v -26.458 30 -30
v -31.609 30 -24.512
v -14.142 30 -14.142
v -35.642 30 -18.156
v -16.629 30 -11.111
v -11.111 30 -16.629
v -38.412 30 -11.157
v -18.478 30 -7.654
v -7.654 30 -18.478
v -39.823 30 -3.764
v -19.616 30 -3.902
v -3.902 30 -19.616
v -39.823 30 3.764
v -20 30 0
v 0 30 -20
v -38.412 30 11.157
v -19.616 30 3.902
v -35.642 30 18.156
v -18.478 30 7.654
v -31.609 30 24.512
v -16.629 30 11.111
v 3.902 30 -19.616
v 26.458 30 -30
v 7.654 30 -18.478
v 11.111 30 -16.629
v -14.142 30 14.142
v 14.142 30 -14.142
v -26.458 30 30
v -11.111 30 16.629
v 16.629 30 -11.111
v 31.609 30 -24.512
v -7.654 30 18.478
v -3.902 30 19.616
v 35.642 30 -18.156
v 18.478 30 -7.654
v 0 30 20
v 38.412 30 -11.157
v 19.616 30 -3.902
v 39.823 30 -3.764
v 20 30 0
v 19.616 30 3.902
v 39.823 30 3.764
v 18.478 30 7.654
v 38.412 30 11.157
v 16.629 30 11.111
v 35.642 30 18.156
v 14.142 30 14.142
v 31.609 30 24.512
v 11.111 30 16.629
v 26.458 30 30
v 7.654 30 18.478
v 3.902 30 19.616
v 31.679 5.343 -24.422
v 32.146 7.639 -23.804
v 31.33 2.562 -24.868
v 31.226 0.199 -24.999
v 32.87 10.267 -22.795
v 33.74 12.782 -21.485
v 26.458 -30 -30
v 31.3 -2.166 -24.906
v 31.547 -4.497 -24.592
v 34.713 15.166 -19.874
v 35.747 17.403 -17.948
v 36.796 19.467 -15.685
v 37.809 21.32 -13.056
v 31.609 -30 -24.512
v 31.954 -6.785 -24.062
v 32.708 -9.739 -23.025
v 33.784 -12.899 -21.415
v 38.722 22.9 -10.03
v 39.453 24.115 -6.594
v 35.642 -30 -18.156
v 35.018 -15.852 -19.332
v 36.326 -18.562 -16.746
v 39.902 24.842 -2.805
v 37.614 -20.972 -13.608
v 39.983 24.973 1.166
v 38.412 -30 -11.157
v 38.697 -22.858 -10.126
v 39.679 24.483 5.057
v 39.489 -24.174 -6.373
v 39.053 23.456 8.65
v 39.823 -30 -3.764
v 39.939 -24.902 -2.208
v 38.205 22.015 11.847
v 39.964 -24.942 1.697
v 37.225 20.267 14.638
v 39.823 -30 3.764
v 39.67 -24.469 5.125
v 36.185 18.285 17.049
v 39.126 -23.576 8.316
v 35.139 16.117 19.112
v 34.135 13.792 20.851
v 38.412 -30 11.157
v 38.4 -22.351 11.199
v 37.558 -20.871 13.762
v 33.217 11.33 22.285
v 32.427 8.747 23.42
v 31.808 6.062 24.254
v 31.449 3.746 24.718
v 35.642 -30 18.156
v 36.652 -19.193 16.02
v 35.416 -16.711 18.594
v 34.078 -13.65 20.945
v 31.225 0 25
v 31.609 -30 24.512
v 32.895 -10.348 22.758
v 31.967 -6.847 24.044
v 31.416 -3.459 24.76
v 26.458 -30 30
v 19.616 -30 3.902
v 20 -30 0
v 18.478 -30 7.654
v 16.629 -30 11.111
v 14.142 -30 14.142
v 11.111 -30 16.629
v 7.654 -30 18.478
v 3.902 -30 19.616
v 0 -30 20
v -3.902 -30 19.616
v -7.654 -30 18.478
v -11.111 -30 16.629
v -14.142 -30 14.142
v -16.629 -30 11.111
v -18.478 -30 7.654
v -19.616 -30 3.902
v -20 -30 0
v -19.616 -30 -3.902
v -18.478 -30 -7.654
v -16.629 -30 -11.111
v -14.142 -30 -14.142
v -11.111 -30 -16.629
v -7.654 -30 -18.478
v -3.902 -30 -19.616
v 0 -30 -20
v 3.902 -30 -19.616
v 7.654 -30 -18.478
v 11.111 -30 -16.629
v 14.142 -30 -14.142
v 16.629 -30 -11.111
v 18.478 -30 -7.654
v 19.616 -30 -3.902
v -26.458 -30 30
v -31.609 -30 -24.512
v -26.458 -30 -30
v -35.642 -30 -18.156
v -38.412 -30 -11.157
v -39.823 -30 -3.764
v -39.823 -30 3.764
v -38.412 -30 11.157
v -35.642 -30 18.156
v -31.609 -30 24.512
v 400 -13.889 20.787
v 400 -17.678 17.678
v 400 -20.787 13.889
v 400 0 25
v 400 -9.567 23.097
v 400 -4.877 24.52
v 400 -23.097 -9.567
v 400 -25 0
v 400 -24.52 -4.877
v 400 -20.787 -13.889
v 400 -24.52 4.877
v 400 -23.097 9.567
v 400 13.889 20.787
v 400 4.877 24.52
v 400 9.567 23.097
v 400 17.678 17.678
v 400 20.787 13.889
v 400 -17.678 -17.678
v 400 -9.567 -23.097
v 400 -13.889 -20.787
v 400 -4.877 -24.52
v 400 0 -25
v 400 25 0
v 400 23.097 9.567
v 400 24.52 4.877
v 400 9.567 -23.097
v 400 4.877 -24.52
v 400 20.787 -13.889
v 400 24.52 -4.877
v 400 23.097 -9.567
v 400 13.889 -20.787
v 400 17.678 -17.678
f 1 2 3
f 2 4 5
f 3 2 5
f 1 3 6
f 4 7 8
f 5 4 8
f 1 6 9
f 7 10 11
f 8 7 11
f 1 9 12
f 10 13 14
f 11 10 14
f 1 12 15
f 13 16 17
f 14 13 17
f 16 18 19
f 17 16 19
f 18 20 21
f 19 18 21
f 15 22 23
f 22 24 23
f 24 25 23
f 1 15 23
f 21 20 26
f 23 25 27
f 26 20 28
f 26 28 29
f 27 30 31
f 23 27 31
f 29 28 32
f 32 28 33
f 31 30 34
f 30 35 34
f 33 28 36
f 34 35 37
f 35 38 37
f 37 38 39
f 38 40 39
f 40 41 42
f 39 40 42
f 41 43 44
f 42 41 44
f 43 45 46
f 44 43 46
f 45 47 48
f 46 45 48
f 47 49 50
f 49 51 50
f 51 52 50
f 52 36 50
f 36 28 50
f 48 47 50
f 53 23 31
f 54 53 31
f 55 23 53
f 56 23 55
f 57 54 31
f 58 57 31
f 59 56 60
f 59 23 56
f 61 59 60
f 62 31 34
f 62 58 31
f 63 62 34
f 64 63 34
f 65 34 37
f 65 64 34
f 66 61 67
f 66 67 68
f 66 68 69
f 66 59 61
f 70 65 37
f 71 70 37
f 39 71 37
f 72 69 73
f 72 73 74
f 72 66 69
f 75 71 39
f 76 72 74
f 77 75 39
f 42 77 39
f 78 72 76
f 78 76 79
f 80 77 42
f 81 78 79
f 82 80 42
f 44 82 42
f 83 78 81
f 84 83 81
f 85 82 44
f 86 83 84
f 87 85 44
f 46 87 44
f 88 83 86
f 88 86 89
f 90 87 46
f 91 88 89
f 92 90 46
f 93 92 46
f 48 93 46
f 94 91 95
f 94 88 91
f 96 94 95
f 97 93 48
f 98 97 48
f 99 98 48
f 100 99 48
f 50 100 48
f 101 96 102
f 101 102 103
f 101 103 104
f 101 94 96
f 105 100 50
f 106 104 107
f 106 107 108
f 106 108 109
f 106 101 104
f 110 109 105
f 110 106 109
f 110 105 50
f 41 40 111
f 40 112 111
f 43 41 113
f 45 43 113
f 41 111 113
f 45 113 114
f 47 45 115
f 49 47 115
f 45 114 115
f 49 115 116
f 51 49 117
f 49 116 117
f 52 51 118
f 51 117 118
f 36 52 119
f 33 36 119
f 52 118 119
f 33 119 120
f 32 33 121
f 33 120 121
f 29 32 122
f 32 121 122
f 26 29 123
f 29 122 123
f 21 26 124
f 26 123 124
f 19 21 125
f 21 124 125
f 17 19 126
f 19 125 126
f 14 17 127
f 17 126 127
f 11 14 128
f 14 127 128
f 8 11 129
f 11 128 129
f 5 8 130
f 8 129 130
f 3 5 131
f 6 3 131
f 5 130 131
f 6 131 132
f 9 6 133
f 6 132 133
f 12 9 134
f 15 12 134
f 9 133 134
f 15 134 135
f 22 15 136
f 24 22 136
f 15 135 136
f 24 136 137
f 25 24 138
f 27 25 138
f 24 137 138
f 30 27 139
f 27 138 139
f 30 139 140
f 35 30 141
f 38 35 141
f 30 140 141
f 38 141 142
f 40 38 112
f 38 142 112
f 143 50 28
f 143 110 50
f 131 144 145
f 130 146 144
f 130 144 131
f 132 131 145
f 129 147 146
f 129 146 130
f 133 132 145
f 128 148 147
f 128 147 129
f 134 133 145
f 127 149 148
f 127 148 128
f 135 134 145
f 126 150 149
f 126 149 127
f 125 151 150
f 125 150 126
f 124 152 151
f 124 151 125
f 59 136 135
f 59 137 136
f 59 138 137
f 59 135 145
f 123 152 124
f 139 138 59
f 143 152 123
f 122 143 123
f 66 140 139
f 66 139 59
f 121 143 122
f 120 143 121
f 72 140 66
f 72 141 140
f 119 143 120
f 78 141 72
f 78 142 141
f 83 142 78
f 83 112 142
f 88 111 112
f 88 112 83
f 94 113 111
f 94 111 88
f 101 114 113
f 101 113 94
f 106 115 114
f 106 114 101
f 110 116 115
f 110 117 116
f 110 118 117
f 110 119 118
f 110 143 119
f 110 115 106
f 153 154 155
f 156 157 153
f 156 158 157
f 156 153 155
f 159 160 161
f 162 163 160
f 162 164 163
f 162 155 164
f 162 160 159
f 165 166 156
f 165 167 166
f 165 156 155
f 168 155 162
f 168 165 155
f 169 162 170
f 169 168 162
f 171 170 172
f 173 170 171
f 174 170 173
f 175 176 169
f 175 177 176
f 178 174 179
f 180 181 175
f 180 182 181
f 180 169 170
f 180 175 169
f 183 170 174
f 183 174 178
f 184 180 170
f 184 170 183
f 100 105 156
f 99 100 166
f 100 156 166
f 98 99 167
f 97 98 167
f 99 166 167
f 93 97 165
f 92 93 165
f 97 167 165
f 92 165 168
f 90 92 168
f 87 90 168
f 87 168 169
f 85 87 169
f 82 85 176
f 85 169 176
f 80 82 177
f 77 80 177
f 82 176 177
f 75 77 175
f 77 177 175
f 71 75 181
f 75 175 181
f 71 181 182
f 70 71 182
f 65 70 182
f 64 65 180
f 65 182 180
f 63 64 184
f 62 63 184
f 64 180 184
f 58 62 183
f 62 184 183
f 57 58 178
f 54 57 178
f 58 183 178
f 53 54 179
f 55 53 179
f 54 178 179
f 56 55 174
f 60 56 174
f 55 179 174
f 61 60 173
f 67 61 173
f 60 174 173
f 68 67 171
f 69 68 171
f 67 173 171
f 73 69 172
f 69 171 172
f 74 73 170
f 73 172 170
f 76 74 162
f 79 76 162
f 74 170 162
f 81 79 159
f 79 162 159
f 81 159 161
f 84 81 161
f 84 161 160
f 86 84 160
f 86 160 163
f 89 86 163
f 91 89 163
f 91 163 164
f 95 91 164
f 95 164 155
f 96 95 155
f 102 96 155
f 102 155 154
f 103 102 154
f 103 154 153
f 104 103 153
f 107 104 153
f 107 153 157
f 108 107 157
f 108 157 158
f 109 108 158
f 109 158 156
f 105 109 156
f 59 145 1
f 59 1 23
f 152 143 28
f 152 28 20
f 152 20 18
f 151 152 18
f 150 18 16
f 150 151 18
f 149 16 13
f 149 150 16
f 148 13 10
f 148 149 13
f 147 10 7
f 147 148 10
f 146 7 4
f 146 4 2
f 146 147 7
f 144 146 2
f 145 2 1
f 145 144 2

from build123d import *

# Parameters (mm, degrees)
F0_W     = 400
F0_H     = 25
F2_R     = 20
F3_DEPTH = 30
F4_DEPTH = 30


with BuildPart() as f1:
    # F0 (on Front) → F1 (revolve)
    with BuildSketch(Plane.XZ):
        with Locations((200, 12.5)):
            Rectangle(F0_W, F0_H)
    revolve(axis=Axis((200, 0, 0), (-1, 0, 0)))

    # F2 (on Front) → F3 (join, symmetric)
    with BuildSketch(Plane.XZ):
        with BuildLine():
            Line((26.457513, 30), (-26.457513, 30))
            ThreePointArc((-26.457513, 30), (-40, 0), (-26.457513, -30))
            Line((-26.457513, -30), (26.457513, -30))
            ThreePointArc((26.457513, -30), (40, 0), (26.457513, 30))
        make_face()
        Circle(F2_R, mode=Mode.SUBTRACT)
        Circle(F2_R)
    extrude(amount=F3_DEPTH, both=True)

    # F2 (on Front) → F4 (cut, symmetric)
    with BuildSketch(Plane.XZ):
        Circle(F2_R)
    extrude(amount=F4_DEPTH, both=True, mode=Mode.SUBTRACT)


solid = f1.part
